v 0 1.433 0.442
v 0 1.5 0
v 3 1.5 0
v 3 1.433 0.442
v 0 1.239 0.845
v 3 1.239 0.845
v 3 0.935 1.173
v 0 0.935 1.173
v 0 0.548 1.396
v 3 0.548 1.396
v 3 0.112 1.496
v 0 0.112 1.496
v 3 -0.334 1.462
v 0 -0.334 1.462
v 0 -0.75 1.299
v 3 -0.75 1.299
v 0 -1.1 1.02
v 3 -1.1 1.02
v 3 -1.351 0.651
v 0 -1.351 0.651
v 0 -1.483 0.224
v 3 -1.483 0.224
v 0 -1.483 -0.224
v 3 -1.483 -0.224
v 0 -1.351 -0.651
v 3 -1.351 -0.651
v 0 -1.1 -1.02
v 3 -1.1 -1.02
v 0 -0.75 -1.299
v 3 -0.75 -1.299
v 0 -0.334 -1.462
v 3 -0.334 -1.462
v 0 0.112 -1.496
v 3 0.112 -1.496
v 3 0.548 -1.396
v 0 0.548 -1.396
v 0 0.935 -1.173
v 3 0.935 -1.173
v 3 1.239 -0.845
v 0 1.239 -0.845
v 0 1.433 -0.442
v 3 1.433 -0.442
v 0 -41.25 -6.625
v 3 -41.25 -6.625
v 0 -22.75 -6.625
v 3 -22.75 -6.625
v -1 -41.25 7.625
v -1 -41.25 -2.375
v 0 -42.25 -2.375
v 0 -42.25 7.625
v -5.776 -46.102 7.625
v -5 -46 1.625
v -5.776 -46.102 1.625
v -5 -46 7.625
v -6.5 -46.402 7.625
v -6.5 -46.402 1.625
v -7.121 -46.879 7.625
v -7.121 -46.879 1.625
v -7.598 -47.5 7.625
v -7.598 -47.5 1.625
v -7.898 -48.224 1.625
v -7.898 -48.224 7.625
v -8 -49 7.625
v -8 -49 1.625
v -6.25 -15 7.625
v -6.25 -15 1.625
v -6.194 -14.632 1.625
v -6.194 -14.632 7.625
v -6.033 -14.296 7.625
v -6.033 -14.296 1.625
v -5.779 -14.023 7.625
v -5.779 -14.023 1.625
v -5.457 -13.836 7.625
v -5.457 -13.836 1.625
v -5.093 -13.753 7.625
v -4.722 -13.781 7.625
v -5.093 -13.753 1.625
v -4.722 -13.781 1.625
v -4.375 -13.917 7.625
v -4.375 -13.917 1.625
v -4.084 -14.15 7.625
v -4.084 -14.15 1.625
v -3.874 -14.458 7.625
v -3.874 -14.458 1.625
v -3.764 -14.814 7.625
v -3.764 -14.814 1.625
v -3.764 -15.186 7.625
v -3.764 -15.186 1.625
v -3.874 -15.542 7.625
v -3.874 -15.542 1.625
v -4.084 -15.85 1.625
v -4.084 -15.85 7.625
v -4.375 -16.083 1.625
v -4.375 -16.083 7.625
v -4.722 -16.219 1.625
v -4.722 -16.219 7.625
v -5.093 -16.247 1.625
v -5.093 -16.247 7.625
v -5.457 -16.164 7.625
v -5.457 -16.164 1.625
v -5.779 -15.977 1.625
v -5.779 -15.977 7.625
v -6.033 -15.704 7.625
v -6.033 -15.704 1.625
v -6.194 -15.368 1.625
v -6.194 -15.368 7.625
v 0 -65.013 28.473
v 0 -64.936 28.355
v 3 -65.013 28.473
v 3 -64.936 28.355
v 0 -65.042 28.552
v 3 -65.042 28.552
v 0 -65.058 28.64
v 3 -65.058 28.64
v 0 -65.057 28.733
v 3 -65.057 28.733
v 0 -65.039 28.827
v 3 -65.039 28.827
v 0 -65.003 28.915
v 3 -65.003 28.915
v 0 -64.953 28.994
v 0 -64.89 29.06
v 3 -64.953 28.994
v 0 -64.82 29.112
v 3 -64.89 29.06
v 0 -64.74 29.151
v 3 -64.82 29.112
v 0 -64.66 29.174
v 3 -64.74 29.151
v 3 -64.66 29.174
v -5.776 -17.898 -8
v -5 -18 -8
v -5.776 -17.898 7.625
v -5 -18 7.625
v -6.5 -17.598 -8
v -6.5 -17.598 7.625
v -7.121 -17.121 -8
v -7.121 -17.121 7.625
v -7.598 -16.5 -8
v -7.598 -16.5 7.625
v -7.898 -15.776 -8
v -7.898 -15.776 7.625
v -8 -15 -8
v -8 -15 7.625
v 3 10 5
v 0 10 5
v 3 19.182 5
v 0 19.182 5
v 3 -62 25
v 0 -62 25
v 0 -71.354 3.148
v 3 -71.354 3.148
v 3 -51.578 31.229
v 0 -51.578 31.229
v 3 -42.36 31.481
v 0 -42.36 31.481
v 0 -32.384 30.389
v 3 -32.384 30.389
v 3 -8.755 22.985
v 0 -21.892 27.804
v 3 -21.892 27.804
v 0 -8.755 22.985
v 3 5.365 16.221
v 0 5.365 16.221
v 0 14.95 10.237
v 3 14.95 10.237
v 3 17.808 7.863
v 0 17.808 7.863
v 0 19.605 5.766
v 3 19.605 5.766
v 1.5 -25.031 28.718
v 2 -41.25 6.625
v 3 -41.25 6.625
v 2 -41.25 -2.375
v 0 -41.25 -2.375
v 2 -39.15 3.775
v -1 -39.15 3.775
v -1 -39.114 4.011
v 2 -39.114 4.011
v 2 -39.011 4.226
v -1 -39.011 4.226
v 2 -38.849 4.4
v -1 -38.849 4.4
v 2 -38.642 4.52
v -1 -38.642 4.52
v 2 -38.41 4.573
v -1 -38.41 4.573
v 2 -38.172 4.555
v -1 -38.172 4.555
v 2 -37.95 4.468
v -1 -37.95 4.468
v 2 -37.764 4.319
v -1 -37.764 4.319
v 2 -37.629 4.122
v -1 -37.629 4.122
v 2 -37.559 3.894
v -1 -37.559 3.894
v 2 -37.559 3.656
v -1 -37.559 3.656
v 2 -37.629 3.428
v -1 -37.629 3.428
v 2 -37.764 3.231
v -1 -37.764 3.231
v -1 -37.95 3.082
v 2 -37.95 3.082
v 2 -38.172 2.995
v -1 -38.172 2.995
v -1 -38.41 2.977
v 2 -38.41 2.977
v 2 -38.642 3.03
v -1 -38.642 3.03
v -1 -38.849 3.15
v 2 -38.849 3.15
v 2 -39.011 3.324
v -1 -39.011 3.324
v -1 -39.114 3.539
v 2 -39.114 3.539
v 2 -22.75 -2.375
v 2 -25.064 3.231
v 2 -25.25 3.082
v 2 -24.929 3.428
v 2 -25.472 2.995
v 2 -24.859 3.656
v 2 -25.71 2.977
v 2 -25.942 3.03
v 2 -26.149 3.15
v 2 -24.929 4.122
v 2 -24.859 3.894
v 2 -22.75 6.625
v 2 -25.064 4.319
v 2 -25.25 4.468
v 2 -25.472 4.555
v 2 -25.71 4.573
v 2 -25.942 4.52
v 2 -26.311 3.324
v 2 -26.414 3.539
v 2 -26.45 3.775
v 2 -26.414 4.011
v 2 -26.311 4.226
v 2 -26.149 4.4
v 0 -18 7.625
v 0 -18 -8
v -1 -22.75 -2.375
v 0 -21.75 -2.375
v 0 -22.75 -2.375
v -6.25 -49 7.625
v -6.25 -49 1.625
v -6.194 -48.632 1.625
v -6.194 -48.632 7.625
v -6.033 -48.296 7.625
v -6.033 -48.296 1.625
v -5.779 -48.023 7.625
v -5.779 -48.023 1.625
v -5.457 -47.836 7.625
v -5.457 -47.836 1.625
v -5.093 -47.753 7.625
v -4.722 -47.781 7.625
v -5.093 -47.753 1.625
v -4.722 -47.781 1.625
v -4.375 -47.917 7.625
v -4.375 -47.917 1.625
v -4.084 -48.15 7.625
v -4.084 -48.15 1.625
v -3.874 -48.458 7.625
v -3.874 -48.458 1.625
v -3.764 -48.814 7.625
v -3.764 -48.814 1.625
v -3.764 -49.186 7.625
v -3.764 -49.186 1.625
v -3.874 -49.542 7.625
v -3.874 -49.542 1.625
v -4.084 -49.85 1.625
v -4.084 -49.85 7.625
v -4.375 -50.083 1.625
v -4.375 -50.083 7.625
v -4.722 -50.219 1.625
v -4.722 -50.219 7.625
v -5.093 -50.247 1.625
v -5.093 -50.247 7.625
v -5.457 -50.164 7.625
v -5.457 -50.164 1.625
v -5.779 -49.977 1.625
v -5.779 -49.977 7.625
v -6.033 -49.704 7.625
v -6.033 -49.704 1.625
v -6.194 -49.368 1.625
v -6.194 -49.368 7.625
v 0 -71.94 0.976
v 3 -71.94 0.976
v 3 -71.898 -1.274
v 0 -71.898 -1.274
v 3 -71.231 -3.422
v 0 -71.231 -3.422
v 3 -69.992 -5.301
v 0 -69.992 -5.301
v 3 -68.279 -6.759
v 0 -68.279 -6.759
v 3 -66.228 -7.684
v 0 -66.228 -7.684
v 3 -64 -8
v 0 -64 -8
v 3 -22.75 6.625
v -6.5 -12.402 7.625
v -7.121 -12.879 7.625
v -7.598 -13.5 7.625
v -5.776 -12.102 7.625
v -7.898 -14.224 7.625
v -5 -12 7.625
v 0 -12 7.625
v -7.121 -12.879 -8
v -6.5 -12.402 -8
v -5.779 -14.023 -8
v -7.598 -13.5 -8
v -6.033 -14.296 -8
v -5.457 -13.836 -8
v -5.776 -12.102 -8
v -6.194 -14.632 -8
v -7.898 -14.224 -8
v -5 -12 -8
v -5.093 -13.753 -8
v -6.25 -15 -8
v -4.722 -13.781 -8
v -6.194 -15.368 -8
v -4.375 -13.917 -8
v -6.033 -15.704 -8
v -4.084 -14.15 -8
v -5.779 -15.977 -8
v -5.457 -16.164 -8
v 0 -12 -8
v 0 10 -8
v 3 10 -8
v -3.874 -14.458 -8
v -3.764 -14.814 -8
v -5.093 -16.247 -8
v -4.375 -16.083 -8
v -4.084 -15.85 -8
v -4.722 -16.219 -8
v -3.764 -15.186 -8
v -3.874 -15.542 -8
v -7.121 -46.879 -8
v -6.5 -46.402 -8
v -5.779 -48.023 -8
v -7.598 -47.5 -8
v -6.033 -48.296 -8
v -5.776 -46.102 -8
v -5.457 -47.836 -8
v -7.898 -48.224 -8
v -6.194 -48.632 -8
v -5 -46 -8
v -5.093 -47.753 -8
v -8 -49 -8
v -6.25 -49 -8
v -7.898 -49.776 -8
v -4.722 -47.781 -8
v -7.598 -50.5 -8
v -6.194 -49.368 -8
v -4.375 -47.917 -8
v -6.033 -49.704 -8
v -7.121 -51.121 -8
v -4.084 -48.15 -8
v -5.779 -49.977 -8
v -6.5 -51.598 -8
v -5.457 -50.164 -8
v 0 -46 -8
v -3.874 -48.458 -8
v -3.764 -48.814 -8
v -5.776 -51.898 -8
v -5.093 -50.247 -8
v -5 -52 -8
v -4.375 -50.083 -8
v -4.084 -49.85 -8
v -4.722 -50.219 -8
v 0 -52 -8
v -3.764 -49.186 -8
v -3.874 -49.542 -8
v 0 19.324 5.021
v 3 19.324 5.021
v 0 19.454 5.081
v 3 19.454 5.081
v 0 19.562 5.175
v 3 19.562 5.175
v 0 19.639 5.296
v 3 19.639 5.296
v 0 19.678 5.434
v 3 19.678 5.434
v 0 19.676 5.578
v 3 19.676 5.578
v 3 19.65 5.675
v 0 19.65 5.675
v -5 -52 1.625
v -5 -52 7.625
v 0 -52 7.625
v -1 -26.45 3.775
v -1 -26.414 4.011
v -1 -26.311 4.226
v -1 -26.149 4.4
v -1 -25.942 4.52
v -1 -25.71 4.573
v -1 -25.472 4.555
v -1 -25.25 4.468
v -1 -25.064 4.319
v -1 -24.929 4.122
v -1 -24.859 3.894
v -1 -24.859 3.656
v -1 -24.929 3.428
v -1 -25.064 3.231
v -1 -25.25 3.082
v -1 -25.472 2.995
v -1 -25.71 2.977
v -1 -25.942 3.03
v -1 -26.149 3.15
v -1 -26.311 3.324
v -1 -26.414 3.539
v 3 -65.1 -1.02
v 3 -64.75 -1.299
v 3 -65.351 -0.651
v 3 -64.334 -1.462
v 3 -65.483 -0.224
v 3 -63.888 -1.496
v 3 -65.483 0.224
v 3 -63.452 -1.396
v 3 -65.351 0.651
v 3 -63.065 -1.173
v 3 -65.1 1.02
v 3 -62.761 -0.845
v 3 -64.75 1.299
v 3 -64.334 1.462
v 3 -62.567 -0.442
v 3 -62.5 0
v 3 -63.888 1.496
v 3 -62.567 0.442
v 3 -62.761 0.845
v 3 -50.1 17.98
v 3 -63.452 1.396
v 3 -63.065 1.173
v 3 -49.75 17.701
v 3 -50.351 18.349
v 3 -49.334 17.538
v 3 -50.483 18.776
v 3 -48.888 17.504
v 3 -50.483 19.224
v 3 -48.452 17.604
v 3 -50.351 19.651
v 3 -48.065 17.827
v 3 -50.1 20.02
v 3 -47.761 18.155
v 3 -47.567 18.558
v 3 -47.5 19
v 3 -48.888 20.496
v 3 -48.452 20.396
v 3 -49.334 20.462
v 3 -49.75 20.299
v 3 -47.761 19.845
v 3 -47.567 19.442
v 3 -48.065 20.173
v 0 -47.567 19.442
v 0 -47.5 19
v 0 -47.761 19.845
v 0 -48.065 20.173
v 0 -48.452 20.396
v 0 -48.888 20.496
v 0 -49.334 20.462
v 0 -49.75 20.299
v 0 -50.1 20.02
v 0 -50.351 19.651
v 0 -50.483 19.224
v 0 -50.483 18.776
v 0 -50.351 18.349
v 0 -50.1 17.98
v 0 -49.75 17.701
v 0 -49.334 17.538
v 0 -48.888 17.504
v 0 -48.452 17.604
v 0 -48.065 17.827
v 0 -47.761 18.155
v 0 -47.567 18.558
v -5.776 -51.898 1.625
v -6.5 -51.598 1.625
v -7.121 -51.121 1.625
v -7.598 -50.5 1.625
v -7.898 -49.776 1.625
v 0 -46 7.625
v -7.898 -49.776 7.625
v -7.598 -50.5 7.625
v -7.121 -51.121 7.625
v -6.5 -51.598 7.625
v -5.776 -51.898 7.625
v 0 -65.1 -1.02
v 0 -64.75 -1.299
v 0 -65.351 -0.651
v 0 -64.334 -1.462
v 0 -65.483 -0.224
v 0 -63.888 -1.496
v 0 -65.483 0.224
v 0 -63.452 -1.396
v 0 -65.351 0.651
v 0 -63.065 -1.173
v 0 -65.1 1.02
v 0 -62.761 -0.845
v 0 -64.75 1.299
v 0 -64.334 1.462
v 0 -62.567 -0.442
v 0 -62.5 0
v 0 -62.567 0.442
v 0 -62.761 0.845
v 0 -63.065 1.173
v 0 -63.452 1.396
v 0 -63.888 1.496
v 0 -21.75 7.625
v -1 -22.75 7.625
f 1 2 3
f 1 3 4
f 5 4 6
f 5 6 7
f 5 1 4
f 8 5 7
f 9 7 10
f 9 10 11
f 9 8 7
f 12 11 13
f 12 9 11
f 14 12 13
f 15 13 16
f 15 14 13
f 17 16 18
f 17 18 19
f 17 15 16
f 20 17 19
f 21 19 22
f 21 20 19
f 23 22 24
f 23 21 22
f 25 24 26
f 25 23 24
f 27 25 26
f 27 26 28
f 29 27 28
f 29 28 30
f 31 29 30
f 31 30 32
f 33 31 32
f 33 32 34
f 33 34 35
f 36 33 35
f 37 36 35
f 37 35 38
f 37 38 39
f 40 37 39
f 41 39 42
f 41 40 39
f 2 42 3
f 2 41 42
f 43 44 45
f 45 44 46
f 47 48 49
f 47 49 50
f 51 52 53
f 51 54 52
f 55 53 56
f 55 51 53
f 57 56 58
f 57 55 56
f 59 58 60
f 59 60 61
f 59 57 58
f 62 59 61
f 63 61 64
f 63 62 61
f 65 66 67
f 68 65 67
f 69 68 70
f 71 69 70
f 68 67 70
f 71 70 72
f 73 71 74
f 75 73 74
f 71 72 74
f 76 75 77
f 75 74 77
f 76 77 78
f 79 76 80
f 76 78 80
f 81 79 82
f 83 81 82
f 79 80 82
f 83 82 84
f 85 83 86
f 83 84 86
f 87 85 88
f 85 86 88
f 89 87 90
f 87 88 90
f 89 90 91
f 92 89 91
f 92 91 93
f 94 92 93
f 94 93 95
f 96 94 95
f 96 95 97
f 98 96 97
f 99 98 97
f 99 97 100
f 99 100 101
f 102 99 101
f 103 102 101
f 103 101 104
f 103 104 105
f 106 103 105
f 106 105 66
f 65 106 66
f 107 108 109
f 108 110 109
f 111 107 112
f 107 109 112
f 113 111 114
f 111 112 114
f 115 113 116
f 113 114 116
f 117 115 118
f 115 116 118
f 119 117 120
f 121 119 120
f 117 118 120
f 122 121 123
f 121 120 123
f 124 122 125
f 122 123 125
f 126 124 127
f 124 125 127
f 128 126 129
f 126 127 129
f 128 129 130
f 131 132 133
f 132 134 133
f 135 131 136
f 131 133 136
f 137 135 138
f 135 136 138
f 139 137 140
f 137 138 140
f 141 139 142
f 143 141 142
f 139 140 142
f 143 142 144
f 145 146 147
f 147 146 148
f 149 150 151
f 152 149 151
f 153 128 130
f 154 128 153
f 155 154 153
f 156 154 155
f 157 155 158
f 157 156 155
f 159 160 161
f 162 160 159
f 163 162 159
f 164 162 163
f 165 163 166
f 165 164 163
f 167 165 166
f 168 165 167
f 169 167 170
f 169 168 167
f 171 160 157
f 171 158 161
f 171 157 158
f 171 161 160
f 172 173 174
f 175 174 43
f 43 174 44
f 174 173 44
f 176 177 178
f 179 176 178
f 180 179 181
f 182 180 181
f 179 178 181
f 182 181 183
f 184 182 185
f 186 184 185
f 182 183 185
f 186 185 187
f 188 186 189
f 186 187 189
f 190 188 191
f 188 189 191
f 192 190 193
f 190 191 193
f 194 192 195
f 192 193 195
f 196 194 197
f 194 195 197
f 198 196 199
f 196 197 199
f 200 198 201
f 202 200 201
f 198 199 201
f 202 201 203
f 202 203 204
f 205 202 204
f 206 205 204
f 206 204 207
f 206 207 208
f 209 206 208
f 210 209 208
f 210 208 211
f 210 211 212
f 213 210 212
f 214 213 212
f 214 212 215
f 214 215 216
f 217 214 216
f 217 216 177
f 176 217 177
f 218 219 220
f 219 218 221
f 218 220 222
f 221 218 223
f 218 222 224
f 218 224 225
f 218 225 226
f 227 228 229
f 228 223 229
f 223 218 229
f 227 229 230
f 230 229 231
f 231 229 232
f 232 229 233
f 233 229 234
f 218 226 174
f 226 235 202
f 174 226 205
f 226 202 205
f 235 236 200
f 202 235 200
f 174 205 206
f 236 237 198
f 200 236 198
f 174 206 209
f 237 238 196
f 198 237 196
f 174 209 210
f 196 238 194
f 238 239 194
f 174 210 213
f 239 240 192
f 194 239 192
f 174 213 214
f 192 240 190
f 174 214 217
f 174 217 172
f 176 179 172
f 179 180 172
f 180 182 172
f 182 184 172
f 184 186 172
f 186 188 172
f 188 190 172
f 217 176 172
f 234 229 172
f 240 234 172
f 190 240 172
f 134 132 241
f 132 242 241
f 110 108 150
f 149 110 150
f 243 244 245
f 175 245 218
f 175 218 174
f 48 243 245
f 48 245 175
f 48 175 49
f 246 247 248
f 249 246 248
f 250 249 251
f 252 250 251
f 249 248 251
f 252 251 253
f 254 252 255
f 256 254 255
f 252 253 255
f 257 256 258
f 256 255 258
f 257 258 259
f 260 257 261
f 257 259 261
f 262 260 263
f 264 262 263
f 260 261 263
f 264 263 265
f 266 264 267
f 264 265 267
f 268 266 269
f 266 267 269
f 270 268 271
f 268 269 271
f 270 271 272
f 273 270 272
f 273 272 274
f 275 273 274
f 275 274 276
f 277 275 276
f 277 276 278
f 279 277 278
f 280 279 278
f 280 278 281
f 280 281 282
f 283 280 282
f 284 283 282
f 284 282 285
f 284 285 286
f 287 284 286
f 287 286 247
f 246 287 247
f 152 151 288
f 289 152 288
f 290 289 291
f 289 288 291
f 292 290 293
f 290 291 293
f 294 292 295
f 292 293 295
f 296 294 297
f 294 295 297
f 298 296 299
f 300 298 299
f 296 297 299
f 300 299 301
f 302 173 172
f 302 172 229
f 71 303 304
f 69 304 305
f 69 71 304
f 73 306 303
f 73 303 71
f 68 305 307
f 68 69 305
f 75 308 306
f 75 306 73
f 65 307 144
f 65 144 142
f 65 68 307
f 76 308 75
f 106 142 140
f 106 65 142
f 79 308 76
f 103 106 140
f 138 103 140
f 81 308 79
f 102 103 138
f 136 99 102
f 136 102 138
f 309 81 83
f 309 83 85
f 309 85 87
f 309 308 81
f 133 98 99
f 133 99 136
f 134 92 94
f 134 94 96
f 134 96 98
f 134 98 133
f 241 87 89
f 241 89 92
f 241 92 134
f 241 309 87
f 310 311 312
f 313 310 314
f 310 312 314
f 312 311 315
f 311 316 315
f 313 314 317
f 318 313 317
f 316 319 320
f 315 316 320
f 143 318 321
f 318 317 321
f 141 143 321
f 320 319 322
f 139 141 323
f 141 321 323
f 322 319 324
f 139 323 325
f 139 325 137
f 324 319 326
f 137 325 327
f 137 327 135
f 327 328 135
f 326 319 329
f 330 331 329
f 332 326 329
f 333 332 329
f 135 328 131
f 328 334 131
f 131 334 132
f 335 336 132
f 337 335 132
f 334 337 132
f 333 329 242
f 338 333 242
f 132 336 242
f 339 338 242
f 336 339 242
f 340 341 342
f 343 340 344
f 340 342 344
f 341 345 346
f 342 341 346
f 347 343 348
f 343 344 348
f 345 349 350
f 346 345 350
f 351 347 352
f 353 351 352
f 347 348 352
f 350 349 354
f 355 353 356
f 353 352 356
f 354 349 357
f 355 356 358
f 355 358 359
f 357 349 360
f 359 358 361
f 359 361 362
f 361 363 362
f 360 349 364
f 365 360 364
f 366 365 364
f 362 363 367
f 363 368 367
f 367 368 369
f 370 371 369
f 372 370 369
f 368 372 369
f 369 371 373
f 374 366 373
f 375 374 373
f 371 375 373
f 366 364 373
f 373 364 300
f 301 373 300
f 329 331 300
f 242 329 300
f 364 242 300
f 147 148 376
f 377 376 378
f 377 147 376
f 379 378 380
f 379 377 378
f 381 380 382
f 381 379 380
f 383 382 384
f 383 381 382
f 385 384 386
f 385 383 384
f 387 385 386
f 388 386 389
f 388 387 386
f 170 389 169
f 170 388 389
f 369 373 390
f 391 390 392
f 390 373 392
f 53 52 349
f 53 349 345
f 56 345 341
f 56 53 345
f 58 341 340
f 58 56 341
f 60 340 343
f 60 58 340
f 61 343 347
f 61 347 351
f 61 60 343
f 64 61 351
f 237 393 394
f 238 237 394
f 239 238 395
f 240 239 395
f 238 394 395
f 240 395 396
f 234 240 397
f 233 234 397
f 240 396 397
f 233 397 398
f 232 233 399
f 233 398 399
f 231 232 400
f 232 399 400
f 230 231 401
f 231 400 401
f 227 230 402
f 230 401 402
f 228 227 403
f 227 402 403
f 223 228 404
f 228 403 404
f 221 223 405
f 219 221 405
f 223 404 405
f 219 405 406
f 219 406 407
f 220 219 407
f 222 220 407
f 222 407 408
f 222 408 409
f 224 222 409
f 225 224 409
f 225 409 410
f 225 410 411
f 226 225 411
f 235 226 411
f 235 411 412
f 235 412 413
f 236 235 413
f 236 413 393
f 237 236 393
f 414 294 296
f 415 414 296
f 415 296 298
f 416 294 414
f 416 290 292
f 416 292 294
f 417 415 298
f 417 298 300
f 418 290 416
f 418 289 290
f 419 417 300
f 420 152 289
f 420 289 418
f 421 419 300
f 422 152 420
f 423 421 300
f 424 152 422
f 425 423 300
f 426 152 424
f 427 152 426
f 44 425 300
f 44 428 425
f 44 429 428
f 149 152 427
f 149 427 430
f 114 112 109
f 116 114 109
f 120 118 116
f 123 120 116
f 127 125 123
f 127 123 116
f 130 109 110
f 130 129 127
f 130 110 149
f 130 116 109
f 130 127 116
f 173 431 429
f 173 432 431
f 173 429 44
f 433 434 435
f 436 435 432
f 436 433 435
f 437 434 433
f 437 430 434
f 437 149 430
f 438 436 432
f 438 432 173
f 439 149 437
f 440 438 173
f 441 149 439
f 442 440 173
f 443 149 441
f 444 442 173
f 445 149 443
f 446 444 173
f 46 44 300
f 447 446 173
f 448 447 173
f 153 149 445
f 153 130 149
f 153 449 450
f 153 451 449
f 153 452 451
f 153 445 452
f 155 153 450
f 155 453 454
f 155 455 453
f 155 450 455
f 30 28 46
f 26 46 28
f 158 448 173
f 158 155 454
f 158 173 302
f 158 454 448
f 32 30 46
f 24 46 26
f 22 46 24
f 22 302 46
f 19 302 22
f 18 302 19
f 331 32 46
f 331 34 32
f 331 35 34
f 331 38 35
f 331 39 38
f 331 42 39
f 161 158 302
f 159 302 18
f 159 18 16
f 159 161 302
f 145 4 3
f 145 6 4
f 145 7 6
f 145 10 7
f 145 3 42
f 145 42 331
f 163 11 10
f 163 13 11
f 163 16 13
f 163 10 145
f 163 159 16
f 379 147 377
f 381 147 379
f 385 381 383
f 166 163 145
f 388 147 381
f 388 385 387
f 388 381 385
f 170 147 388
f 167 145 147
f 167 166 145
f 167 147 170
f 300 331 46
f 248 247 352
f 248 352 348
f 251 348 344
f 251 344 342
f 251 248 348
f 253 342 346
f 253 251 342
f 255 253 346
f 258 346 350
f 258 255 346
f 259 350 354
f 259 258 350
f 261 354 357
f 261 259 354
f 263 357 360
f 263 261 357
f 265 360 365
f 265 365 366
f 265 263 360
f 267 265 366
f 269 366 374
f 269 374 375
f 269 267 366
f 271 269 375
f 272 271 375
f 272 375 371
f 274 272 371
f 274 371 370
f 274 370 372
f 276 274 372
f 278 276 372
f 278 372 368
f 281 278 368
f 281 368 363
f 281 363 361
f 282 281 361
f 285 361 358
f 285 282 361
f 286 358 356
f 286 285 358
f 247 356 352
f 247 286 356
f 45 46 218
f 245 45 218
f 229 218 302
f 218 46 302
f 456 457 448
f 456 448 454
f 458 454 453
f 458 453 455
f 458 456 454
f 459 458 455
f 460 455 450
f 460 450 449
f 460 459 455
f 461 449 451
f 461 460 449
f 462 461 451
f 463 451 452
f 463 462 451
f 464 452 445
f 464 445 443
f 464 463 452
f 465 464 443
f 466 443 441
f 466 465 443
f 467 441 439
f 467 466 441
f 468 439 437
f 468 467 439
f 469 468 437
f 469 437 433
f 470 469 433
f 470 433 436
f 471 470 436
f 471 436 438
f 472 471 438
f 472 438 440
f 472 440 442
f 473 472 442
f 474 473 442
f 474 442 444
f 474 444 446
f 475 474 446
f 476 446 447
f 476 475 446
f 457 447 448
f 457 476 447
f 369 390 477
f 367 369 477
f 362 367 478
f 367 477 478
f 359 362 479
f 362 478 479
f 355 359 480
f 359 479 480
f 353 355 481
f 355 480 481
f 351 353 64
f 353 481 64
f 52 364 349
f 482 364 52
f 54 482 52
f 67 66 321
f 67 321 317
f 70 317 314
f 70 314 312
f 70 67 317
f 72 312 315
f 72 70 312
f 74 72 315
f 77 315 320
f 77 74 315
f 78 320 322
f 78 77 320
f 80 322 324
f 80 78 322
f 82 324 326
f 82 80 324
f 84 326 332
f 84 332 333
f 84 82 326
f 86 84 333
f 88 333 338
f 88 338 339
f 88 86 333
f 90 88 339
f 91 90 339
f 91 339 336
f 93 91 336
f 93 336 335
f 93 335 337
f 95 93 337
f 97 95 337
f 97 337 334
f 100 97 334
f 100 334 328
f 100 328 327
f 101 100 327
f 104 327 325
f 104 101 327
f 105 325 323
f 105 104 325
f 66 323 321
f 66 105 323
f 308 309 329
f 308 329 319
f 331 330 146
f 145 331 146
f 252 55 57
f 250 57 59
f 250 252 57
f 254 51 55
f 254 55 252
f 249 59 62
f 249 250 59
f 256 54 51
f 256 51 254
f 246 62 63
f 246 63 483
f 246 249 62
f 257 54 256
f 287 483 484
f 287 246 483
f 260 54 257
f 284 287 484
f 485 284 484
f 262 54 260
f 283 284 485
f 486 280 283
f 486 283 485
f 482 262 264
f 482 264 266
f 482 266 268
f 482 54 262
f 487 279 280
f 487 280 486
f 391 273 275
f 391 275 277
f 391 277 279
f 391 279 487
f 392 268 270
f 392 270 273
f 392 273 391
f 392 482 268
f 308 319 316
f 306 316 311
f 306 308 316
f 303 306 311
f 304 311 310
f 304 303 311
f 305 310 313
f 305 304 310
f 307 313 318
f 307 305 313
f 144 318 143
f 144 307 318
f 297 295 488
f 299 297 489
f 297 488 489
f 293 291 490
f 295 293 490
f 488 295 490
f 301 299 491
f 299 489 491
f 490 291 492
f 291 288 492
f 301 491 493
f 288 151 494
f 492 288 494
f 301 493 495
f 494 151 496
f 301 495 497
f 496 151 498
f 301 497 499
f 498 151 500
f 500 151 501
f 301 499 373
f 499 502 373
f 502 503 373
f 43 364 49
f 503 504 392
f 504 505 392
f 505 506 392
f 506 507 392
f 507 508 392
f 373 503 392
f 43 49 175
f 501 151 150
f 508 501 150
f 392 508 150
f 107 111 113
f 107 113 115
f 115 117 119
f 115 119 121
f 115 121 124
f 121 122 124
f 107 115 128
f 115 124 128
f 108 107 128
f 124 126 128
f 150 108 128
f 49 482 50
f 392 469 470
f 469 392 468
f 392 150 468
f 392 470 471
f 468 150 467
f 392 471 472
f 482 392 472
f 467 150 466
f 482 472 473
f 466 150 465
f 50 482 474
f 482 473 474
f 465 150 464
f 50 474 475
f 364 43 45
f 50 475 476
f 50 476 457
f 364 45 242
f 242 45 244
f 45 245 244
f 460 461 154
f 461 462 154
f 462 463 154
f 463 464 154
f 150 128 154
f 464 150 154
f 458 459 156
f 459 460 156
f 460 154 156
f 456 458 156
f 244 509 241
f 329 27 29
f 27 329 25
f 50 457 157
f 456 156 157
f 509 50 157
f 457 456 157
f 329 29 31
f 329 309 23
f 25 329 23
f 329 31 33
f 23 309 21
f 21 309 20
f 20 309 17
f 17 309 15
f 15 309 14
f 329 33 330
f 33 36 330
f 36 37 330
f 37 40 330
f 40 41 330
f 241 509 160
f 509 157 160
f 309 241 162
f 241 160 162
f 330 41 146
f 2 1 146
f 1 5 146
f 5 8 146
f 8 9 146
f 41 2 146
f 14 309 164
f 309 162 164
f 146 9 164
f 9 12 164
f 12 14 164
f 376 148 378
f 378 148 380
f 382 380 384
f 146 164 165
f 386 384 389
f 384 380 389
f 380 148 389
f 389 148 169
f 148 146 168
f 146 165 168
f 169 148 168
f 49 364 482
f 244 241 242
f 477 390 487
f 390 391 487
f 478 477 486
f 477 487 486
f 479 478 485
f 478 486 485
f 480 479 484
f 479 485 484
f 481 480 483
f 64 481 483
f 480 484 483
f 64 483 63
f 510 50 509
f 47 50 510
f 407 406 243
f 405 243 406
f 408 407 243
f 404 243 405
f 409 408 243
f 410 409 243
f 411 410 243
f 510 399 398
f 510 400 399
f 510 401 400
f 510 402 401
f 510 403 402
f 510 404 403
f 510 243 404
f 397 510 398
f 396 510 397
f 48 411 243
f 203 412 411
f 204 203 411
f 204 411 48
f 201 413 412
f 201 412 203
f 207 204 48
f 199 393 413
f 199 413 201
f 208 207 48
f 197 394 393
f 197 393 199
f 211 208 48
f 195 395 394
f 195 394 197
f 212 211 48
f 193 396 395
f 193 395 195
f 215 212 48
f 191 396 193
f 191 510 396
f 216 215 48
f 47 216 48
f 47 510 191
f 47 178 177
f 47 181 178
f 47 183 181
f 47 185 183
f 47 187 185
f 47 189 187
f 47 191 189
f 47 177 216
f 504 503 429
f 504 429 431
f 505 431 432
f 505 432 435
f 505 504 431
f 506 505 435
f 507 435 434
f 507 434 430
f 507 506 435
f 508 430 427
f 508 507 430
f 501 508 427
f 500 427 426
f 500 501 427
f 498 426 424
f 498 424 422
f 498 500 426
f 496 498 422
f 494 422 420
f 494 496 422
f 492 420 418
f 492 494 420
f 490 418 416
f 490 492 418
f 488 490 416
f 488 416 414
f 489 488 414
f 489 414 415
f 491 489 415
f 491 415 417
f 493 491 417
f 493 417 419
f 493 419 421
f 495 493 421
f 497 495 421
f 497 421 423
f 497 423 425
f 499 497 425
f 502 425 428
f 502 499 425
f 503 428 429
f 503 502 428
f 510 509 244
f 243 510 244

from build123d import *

# Parameters (mm, degrees)
F0_R      = 1.5
F1_DEPTH  = 3
F2_W      = 18.5
F2_H      = 6.625
F3_DEPTH  = 25
F4_W      = 18.5
F4_H      = 9
F5_DEPTH  = 1
F6_DEPTH  = 2
F8_D      = 1.6
F9_SIZE   = 0.99999
F10_W     = 6
F10_H     = 6
F11_DEPTH = 8
F12_R     = 2.99999
F13_W     = 6
F13_H     = 6
F14_DEPTH = 8
F15_R     = 2.99999
F17_D     = 2.5
F18_R     = 0.5
F19_DEPTH = 9.625


# Not quite as in the source:
# - a fillet or chamfer is up to 0.001 mm smaller than in the source, because OpenCascade refuses the exact size


with BuildPart() as f1:
    # F0 (on Right) → F1 (new body)
    with BuildSketch(Plane.YZ):
        with BuildLine():
            Line((-64, -8), (10, -8))
            Line((10, -8), (10, 5))
            Line((10, 5), (20, 5))
            add(Edge.make_bspline(
                [(-65.5, 29), (-53.1884357333, 31.5765216947), (-28.2810822655, 35.0271902112), (17.668255518, 10.972023372), (20, 5)],
                knots=[0, 0, 0, 0, 0.471377868, 1, 1, 1, 1], degree=3))
            Line((-65.5, 29), (-62, 25))
            Line((-62, 25), (-71.3544447211, 3.1483555777))
            ThreePointArc((-71.3544447211, 3.1483555777), (-70.677830659, -4.4052897395), (-64, -8))
        make_face()
        with Locations((-64, 0)):
            Circle(F0_R, mode=Mode.SUBTRACT)
        Circle(F0_R, mode=Mode.SUBTRACT)
        with Locations((-49, 19)):
            Circle(F0_R, mode=Mode.SUBTRACT)
    extrude(amount=F1_DEPTH)

    # F2 (on face) → F3 (cut)
    with BuildSketch(Plane.YZ.offset(3)):
        with Locations((-32, 3.3125)):
            Rectangle(F2_W, F2_H)
        with Locations((-32, -3.3125)):
            Rectangle(F2_W, F2_H)
    extrude(amount=-F3_DEPTH, mode=Mode.SUBTRACT)

    # F4 (on face) → F5 (join)
    with BuildSketch(Plane(origin=(0, 0, 0), x_dir=(0, -1, 0), z_dir=(-1, 0, 0))):
        with Locations((32, 2.125)):
            Rectangle(F4_W, F4_H)
        Polygon((42.25, -2.375), (42.25, 7.625), (21.75, 7.625), (21.75, -2.375), (22.75, -2.375), (22.75, 6.625), (41.25, 6.625), (41.25, -2.375), align=None)
    extrude(amount=F5_DEPTH)

    # F6 (add): a face of the model
    f6_faces = [f1.faces().sort_by_distance(p)[0] for p in [
        (0, -32, 2.125),
    ]]
    extrude(f6_faces, amount=F6_DEPTH)

    # F8 (through all)
    with Locations(Plane.YZ.offset(2)):
        with Locations((-38.35, 3.775), (-25.65, 3.775)):
            Hole(F8_D / 2)

    # F9 (size 1 in the source; OpenCascade refuses exactly that, so slightly less here)
    f9_edges = [f1.edges().sort_by_distance(p)[0] for p in [
        (-1, -21.75, 2.625),
        (-1, -42.25, 2.625),
    ]]
    chamfer(f9_edges, length=F9_SIZE)

    # F10 (on face) → F11 (join)
    with BuildSketch(Plane(origin=(0, 0, 0), x_dir=(0, -1, 0), z_dir=(-1, 0, 0))):
        with Locations((49, 4.625)):
            Rectangle(F10_W, F10_H)
    extrude(amount=F11_DEPTH)

    # F12 (radius 3 in the source; OpenCascade refuses exactly that, so slightly less here)
    f12_edges = [f1.edges().sort_by_distance(p)[0] for p in [
        (-8, -52, 4.625),
        (-8, -46, 4.625),
    ]]
    fillet(f12_edges, radius=F12_R)

    # F13 (on face) → F14 (join)
    with BuildSketch(Plane(origin=(0, 0, 0), x_dir=(0, -1, 0), z_dir=(-1, 0, 0))):
        with Locations((15, 4.625)):
            Rectangle(F13_W, F13_H)
    extrude(amount=F14_DEPTH)

    # F15 (radius 3 in the source; OpenCascade refuses exactly that, so slightly less here)
    f15_edges = [f1.edges().sort_by_distance(p)[0] for p in [
        (-8, -12, 4.625),
        (-8, -18, 4.625),
    ]]
    fillet(f15_edges, radius=F15_R)

    # F17 (through all)
    with Locations(Plane.XY.offset(7.625)):
        with Locations((-5, -49), (-5, -15)):
            Hole(F17_D / 2)

    # F18
    f18_edges = [f1.edges().sort_by_distance(p)[0] for p in [
        (1.5, -65.5, 29),
        (1.5, 20, 5),
    ]]
    fillet(f18_edges, radius=F18_R)

    # F19 (add): faces of the model
    f19_faces = [f1.faces().sort_by_distance(p)[0] for p in [
        (-3.5469743881, -15, 1.625),
        (-3.5469743881, -49, 1.625),
    ]]
    extrude(f19_faces, amount=F19_DEPTH)


solid = f1.part
